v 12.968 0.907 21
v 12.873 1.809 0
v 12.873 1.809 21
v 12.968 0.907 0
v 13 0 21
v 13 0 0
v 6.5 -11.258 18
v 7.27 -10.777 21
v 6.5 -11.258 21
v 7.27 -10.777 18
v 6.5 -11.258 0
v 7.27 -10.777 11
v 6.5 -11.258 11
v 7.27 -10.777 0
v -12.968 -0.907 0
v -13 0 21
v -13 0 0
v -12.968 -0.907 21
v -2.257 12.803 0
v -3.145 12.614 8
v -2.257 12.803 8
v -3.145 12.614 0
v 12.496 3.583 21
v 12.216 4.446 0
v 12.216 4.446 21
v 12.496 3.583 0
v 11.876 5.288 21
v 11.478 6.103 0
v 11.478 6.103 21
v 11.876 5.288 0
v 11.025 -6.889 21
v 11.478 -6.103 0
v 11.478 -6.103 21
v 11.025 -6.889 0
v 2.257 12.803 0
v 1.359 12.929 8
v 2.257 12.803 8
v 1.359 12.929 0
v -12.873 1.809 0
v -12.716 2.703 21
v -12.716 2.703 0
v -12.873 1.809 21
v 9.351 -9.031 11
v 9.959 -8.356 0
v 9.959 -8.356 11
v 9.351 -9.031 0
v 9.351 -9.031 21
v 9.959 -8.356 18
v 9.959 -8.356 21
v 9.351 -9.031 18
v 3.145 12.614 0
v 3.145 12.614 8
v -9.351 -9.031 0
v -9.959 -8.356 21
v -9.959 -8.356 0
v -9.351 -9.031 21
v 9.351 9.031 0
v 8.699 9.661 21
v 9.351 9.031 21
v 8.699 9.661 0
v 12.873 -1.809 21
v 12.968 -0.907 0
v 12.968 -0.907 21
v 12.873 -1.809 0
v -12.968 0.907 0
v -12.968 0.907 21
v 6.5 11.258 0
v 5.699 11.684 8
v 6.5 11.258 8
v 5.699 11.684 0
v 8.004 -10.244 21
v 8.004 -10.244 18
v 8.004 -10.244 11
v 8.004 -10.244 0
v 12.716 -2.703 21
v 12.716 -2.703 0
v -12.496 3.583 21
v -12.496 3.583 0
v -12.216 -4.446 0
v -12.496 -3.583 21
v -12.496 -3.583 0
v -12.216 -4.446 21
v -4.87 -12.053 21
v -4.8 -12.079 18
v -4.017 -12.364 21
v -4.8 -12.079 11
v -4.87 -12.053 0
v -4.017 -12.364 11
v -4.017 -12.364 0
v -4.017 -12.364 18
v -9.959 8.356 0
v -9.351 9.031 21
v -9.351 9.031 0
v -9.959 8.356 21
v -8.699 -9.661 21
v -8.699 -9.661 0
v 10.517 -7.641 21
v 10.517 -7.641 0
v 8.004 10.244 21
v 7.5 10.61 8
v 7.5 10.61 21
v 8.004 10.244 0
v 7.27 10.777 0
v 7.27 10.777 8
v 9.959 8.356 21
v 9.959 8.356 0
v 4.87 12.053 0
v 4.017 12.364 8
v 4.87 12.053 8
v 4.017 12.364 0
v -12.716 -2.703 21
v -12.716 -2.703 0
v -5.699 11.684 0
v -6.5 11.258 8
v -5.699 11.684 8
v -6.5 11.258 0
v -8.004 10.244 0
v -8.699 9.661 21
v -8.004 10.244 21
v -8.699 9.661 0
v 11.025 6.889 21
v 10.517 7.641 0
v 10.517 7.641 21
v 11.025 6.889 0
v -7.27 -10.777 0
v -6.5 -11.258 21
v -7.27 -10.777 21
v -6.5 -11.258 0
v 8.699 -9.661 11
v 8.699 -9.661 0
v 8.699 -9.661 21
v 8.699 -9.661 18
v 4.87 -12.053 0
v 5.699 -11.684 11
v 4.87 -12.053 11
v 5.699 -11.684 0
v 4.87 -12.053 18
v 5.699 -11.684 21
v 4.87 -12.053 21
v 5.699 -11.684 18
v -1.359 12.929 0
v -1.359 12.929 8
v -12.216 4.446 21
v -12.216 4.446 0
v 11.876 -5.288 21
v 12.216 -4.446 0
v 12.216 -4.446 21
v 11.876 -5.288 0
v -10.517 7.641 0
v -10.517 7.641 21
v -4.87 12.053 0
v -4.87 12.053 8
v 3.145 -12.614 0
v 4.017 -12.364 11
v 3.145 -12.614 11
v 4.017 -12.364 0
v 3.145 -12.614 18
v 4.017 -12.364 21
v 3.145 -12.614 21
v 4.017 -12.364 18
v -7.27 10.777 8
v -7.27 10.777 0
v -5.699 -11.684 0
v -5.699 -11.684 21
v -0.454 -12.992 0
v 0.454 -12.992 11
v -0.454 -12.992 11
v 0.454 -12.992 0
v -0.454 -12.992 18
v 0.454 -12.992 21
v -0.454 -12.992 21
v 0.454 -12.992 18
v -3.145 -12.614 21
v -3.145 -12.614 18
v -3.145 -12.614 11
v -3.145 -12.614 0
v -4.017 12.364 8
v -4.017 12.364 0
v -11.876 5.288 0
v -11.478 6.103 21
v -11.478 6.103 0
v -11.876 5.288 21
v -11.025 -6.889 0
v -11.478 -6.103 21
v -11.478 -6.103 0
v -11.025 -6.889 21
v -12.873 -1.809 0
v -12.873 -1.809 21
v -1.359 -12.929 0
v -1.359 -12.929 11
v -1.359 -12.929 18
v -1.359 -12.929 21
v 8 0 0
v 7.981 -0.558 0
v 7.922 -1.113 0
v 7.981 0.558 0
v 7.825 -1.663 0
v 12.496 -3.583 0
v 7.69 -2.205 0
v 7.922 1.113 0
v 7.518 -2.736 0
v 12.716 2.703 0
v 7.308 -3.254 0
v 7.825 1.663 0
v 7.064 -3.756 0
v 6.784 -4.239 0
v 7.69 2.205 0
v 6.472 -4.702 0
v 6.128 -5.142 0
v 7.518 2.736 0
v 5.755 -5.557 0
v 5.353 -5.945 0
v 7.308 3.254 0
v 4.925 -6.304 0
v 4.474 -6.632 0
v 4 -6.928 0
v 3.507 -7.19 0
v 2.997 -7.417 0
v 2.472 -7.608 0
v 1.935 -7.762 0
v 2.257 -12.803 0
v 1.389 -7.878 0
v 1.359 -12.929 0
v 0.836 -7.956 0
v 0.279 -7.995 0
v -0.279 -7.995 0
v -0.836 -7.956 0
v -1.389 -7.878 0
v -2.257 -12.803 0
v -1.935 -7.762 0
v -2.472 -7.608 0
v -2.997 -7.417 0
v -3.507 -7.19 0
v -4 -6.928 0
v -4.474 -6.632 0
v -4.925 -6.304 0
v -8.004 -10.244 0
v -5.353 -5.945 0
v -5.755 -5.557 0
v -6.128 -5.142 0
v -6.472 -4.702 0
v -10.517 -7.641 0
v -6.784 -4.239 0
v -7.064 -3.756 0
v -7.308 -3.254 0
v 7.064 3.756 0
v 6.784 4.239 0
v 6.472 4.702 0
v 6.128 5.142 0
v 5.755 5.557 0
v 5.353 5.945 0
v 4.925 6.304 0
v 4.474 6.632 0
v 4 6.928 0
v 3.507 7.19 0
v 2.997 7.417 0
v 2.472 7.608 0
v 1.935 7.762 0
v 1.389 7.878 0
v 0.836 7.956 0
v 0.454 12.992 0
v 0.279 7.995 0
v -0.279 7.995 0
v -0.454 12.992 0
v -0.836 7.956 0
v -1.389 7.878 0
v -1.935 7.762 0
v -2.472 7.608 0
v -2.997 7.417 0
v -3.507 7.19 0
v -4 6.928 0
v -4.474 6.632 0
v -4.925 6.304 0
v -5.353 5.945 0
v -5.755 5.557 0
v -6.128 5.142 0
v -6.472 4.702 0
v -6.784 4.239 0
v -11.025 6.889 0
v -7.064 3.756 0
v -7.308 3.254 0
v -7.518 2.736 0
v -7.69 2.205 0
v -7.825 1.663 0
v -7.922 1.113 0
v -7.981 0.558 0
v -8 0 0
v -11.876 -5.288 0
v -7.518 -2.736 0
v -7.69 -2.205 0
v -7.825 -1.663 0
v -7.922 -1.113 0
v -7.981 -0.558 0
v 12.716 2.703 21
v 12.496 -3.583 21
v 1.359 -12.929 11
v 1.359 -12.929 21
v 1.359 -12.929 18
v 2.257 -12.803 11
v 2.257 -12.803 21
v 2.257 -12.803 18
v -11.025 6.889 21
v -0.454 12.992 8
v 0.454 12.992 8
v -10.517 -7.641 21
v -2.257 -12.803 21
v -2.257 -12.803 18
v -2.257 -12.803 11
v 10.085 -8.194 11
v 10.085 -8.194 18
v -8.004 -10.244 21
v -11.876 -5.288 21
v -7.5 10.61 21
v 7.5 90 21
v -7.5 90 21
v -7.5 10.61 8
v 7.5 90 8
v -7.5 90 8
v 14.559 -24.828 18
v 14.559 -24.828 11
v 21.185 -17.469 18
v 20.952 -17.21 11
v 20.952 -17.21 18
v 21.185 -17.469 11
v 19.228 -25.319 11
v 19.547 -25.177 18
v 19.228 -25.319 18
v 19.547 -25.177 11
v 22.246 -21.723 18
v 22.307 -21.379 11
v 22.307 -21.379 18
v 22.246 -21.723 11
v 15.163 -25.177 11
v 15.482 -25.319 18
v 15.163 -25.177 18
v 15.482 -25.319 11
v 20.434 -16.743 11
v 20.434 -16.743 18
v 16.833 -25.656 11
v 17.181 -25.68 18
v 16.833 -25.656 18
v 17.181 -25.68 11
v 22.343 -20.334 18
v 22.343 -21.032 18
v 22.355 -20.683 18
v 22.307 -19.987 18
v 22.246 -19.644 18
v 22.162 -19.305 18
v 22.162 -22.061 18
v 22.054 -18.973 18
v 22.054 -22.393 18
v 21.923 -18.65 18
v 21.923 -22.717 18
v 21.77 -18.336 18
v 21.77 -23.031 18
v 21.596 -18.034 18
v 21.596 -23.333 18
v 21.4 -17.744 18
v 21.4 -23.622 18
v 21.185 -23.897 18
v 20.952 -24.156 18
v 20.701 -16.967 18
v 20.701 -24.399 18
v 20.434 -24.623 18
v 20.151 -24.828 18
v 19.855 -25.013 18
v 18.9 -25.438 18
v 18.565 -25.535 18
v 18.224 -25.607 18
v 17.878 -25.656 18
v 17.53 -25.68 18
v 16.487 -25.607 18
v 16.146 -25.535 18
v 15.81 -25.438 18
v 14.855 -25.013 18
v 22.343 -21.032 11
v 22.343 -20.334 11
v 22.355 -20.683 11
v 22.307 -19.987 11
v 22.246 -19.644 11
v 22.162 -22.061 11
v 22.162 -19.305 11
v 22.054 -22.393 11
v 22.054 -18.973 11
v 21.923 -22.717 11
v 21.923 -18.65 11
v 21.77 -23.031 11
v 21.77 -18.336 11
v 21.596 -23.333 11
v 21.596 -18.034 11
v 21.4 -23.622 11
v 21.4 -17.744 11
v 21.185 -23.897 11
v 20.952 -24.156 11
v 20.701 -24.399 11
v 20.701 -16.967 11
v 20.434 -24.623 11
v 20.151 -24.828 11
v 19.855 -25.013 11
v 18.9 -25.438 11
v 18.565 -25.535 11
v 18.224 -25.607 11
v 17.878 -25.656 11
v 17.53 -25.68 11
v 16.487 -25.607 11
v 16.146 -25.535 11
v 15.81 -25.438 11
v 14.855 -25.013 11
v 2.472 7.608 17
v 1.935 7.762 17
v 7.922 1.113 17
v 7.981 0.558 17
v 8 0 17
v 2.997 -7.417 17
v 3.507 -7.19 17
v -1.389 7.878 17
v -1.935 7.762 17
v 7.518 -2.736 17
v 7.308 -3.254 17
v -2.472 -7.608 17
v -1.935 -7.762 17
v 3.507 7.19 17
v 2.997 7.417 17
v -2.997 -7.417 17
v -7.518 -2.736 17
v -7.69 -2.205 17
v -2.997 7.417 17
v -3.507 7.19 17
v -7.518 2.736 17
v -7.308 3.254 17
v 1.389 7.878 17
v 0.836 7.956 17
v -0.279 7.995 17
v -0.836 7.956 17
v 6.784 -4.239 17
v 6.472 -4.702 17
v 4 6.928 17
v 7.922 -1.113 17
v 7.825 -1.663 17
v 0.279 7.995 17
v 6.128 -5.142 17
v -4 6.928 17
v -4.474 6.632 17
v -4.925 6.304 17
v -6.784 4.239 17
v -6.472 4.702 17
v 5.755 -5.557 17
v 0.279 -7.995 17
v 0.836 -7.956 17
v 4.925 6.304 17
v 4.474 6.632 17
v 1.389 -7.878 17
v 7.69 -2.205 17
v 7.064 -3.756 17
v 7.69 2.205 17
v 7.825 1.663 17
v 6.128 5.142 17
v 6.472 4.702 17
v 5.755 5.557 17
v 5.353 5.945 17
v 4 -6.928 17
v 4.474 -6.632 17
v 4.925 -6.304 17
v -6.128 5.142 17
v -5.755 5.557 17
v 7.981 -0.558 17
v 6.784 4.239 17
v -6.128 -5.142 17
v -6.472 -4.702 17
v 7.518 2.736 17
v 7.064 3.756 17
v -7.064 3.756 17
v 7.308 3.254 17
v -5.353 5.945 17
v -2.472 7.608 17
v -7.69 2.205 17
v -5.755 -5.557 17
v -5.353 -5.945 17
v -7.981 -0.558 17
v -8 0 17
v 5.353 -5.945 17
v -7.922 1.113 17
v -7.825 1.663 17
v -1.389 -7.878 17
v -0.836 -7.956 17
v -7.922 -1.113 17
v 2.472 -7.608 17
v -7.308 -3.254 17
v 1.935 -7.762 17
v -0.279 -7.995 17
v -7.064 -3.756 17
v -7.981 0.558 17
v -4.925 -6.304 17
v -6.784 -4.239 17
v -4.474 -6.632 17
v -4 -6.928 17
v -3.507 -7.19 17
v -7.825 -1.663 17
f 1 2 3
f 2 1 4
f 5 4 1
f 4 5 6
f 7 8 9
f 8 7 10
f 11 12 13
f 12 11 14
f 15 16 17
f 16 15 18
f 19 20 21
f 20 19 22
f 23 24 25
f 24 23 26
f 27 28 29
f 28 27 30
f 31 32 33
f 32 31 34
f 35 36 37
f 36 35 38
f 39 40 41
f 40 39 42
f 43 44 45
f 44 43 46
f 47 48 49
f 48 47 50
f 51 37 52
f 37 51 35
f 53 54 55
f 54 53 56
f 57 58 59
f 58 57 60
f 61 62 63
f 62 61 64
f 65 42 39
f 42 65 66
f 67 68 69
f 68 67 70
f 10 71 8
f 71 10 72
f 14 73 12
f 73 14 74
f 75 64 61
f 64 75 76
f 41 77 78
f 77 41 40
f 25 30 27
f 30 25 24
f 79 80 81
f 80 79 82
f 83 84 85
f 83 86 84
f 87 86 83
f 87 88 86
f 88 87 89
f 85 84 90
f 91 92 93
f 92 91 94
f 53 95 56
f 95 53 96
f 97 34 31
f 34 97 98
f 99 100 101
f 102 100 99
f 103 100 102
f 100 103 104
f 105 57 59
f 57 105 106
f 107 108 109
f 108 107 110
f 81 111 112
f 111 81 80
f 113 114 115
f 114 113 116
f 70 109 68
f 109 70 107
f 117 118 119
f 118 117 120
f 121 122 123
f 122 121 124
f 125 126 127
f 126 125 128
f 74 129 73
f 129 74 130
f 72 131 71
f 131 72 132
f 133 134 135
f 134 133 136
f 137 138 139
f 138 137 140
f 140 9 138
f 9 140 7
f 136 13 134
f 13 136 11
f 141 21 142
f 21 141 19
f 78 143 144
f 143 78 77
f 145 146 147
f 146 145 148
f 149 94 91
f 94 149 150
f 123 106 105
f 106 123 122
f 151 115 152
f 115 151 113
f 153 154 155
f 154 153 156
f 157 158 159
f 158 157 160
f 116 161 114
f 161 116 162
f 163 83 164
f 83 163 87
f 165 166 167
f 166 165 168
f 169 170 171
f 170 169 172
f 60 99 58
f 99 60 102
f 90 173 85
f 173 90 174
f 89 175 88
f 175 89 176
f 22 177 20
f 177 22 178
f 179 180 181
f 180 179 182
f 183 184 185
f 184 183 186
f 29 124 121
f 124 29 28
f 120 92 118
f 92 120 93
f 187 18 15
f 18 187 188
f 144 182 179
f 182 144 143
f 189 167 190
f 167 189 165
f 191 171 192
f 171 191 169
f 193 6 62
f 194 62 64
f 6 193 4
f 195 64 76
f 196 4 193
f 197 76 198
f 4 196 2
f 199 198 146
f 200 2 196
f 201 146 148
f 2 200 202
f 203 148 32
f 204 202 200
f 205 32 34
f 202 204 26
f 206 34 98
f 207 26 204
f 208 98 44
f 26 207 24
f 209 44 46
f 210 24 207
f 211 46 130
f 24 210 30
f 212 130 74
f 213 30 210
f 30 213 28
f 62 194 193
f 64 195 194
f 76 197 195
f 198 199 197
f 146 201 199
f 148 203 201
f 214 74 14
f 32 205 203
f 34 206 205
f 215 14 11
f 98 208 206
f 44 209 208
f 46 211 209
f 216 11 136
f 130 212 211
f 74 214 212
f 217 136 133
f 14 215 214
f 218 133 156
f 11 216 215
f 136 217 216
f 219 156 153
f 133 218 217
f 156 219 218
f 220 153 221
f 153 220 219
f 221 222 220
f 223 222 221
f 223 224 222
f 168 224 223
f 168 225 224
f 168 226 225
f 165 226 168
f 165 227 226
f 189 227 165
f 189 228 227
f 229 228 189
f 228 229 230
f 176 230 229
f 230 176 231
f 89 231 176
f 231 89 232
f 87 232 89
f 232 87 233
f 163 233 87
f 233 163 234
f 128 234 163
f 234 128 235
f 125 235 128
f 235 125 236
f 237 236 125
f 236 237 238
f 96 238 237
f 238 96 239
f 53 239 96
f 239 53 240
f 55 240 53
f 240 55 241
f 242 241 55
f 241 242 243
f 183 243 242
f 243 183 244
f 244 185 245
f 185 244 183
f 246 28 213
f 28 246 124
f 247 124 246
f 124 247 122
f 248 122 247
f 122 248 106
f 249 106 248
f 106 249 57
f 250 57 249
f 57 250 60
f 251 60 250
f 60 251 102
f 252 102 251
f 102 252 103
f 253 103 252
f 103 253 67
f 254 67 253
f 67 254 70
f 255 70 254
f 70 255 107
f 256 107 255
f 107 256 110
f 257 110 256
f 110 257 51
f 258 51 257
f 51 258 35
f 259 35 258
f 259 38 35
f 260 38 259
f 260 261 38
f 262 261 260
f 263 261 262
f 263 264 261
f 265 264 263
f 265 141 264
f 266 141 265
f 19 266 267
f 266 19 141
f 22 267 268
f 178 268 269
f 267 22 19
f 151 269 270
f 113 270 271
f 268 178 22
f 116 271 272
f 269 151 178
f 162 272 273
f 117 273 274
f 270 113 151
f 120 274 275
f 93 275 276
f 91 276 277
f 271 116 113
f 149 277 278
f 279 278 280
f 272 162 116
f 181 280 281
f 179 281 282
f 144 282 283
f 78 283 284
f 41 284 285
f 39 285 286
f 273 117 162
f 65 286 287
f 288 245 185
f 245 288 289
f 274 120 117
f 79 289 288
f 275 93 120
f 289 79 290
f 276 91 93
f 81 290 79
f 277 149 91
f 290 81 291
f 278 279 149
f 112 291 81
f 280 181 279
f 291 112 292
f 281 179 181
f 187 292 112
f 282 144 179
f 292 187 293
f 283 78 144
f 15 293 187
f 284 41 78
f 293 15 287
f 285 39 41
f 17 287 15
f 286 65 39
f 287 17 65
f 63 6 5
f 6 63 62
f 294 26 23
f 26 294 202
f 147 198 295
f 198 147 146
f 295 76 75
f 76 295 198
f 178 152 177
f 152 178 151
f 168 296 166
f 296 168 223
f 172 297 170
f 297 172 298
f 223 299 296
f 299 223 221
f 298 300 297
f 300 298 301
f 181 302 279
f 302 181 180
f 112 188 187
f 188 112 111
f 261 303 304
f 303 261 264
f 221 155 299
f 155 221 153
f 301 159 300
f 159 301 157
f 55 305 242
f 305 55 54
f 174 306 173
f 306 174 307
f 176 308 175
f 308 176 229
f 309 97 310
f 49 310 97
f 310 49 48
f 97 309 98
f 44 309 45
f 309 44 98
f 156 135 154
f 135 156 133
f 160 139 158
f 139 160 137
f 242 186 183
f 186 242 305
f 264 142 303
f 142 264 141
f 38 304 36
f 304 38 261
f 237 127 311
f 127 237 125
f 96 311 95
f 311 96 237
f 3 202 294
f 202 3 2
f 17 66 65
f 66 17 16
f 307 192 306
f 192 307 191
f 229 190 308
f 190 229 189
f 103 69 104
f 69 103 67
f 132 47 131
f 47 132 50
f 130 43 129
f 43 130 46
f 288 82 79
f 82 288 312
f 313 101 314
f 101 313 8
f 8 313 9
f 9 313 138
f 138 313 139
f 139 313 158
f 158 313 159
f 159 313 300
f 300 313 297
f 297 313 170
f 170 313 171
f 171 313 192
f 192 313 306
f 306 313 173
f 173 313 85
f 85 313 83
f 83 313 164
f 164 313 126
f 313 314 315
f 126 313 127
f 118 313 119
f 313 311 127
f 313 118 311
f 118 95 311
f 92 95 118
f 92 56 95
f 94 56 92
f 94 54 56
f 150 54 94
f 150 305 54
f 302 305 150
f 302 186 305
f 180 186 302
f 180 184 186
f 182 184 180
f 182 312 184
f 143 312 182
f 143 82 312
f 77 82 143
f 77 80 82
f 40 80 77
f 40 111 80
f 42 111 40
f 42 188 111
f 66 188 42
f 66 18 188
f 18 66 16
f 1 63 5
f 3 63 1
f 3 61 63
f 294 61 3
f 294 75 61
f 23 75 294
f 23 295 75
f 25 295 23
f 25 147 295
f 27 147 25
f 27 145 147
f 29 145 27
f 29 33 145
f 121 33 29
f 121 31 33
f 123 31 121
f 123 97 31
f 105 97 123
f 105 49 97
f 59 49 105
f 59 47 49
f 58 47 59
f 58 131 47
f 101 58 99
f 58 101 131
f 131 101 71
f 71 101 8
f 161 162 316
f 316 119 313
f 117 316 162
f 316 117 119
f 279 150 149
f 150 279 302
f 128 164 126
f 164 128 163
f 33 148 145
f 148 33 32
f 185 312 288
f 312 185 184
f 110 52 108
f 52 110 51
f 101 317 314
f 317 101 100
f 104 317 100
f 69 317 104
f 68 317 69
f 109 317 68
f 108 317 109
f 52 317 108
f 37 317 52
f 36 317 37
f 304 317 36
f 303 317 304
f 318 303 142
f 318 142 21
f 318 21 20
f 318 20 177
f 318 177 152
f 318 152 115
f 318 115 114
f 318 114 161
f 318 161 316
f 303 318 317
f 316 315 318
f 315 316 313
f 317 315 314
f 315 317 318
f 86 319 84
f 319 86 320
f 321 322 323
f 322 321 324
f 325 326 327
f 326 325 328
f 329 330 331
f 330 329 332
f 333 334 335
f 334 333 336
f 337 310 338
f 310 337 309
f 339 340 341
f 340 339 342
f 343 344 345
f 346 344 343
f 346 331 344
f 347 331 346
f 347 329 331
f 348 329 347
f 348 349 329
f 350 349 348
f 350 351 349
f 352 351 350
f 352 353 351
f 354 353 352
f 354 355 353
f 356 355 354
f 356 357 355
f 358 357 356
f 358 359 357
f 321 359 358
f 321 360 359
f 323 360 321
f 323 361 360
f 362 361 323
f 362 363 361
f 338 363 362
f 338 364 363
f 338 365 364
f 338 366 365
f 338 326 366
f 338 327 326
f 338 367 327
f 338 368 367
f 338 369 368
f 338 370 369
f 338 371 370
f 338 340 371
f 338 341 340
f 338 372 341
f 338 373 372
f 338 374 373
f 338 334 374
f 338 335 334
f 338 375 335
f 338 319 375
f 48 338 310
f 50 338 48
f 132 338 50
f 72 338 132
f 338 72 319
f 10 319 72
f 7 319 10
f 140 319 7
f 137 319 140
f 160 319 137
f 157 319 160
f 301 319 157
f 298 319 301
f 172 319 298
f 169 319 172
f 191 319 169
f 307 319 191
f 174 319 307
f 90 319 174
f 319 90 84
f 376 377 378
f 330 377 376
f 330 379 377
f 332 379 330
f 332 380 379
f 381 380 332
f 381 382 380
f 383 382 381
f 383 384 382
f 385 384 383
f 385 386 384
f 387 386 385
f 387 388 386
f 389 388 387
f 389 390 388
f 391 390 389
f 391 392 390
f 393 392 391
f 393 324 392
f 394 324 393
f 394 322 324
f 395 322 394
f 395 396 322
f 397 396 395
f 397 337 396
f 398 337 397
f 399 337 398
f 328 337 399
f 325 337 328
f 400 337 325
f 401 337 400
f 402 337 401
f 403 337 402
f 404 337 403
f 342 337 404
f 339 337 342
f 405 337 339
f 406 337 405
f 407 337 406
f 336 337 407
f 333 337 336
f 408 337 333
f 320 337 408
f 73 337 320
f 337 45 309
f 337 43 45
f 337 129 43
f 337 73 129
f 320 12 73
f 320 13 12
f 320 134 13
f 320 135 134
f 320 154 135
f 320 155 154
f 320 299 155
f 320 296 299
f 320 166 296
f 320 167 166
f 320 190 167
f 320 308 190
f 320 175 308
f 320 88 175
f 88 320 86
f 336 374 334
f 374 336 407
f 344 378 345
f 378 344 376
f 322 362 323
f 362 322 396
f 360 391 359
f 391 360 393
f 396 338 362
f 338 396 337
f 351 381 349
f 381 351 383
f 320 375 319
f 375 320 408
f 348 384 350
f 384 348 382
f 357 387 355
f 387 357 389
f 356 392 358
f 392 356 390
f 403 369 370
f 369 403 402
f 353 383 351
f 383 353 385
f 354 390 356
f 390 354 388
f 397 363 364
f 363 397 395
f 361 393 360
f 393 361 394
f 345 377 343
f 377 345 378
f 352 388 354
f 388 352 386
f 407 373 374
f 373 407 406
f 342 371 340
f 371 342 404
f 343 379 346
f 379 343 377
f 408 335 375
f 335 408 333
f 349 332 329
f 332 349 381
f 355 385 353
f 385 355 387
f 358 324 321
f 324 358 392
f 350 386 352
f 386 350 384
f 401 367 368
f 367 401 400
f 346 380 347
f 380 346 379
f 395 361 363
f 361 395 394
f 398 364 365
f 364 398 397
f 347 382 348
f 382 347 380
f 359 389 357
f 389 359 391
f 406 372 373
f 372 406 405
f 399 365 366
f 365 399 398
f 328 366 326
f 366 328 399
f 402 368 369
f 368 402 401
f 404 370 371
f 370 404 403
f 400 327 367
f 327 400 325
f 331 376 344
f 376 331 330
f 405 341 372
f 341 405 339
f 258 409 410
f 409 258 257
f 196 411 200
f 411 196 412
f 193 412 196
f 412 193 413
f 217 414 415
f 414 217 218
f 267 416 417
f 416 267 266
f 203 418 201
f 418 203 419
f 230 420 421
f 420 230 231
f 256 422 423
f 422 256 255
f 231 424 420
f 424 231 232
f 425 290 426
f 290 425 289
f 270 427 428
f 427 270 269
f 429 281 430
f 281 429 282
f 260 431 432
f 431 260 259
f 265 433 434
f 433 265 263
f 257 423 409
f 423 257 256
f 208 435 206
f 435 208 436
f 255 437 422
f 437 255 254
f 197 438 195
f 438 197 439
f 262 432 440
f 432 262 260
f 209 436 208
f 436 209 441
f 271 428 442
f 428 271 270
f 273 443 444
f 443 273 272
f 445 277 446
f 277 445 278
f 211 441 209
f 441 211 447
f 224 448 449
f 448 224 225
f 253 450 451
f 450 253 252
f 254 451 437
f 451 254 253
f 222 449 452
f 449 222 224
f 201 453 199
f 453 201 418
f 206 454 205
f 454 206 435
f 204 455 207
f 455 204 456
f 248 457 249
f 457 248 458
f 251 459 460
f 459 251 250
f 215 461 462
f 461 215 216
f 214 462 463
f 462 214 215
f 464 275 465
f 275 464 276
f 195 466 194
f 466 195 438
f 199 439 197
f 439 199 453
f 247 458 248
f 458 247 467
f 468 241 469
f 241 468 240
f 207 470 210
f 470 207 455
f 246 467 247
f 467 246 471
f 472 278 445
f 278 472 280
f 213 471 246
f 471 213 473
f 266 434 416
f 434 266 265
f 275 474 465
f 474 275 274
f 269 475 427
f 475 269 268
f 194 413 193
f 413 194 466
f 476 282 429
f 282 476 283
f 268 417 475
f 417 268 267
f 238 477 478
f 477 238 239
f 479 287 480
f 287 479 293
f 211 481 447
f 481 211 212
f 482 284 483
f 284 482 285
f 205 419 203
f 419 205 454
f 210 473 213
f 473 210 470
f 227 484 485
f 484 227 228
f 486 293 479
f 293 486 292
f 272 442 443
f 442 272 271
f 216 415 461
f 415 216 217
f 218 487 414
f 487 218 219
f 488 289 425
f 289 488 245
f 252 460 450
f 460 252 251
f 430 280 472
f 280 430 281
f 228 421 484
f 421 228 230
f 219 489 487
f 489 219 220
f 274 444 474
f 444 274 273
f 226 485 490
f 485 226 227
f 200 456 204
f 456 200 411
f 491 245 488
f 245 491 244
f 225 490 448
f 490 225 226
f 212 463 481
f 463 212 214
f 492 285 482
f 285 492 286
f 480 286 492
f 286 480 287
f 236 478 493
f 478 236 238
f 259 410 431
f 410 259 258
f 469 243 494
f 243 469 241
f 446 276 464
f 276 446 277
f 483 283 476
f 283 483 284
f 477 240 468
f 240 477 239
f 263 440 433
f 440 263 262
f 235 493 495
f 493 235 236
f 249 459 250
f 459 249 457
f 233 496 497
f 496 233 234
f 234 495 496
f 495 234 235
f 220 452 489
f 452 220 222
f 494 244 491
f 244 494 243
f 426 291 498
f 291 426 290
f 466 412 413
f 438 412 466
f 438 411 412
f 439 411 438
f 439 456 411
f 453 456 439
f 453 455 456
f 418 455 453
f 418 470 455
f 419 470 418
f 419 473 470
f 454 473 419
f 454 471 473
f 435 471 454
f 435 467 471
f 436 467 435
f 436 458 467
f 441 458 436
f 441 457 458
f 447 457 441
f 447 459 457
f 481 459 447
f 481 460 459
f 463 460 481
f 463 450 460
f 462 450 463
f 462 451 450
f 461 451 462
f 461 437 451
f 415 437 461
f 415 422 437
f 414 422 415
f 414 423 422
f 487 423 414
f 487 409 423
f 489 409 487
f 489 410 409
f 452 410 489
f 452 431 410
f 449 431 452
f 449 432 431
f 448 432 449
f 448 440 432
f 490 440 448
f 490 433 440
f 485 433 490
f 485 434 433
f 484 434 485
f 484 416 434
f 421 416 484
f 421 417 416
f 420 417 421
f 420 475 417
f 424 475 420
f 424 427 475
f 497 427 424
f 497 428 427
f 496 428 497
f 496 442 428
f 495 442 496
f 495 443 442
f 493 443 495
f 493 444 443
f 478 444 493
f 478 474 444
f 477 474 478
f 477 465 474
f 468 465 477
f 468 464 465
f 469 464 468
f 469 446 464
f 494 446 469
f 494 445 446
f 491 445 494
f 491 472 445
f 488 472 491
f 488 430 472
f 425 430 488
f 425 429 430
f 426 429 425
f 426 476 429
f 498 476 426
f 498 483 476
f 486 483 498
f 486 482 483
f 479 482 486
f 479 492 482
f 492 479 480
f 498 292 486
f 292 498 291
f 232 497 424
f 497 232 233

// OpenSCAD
post=26;
post_id=16;
pivot_h=17; // includes clearance

handle=23;
handle_length=100;

rocker_tip=10; // radius of rocker tip
rocker_h=7;
rocker_z=11; // how high up rocker is

rocker=27; // center of post to center of rocker_tip
rocker_base=post/2;

// rocker_inset=rocker_tip/2; // how far to pull in rocker from line between cetner of post and rocker tip

rocker_angle=40;  // degrees off line of lever

lever_width=15;
lever_height=13;
lever_length=90; // to outer edge of handle
lever_z=8;
pad=0.1;

post_h=lever_z+lever_height;

$fn=90;

module positive() {
    cylinder(d=post,h=post_h);

    translate([-lever_width/2,0,lever_z])
    cube([lever_width,lever_length,lever_height]);

    rotate([0,0,rocker_angle])
    translate([0,0,rocker_z])
    rocker();
}

module rocker() {
    hull() {
        translate([0,-rocker,0])
        cylinder(d=rocker_tip,h=rocker_h);

        translate([-post/2+rocker_base/2,0])
        cylinder(d=rocker_base,h=rocker_h);
    }
}
module negative() {
    translate([0,0,-pad])
    cylinder(d=post_id,h=pivot_h+pad);
}

difference() {
    positive();
    negative();
}
